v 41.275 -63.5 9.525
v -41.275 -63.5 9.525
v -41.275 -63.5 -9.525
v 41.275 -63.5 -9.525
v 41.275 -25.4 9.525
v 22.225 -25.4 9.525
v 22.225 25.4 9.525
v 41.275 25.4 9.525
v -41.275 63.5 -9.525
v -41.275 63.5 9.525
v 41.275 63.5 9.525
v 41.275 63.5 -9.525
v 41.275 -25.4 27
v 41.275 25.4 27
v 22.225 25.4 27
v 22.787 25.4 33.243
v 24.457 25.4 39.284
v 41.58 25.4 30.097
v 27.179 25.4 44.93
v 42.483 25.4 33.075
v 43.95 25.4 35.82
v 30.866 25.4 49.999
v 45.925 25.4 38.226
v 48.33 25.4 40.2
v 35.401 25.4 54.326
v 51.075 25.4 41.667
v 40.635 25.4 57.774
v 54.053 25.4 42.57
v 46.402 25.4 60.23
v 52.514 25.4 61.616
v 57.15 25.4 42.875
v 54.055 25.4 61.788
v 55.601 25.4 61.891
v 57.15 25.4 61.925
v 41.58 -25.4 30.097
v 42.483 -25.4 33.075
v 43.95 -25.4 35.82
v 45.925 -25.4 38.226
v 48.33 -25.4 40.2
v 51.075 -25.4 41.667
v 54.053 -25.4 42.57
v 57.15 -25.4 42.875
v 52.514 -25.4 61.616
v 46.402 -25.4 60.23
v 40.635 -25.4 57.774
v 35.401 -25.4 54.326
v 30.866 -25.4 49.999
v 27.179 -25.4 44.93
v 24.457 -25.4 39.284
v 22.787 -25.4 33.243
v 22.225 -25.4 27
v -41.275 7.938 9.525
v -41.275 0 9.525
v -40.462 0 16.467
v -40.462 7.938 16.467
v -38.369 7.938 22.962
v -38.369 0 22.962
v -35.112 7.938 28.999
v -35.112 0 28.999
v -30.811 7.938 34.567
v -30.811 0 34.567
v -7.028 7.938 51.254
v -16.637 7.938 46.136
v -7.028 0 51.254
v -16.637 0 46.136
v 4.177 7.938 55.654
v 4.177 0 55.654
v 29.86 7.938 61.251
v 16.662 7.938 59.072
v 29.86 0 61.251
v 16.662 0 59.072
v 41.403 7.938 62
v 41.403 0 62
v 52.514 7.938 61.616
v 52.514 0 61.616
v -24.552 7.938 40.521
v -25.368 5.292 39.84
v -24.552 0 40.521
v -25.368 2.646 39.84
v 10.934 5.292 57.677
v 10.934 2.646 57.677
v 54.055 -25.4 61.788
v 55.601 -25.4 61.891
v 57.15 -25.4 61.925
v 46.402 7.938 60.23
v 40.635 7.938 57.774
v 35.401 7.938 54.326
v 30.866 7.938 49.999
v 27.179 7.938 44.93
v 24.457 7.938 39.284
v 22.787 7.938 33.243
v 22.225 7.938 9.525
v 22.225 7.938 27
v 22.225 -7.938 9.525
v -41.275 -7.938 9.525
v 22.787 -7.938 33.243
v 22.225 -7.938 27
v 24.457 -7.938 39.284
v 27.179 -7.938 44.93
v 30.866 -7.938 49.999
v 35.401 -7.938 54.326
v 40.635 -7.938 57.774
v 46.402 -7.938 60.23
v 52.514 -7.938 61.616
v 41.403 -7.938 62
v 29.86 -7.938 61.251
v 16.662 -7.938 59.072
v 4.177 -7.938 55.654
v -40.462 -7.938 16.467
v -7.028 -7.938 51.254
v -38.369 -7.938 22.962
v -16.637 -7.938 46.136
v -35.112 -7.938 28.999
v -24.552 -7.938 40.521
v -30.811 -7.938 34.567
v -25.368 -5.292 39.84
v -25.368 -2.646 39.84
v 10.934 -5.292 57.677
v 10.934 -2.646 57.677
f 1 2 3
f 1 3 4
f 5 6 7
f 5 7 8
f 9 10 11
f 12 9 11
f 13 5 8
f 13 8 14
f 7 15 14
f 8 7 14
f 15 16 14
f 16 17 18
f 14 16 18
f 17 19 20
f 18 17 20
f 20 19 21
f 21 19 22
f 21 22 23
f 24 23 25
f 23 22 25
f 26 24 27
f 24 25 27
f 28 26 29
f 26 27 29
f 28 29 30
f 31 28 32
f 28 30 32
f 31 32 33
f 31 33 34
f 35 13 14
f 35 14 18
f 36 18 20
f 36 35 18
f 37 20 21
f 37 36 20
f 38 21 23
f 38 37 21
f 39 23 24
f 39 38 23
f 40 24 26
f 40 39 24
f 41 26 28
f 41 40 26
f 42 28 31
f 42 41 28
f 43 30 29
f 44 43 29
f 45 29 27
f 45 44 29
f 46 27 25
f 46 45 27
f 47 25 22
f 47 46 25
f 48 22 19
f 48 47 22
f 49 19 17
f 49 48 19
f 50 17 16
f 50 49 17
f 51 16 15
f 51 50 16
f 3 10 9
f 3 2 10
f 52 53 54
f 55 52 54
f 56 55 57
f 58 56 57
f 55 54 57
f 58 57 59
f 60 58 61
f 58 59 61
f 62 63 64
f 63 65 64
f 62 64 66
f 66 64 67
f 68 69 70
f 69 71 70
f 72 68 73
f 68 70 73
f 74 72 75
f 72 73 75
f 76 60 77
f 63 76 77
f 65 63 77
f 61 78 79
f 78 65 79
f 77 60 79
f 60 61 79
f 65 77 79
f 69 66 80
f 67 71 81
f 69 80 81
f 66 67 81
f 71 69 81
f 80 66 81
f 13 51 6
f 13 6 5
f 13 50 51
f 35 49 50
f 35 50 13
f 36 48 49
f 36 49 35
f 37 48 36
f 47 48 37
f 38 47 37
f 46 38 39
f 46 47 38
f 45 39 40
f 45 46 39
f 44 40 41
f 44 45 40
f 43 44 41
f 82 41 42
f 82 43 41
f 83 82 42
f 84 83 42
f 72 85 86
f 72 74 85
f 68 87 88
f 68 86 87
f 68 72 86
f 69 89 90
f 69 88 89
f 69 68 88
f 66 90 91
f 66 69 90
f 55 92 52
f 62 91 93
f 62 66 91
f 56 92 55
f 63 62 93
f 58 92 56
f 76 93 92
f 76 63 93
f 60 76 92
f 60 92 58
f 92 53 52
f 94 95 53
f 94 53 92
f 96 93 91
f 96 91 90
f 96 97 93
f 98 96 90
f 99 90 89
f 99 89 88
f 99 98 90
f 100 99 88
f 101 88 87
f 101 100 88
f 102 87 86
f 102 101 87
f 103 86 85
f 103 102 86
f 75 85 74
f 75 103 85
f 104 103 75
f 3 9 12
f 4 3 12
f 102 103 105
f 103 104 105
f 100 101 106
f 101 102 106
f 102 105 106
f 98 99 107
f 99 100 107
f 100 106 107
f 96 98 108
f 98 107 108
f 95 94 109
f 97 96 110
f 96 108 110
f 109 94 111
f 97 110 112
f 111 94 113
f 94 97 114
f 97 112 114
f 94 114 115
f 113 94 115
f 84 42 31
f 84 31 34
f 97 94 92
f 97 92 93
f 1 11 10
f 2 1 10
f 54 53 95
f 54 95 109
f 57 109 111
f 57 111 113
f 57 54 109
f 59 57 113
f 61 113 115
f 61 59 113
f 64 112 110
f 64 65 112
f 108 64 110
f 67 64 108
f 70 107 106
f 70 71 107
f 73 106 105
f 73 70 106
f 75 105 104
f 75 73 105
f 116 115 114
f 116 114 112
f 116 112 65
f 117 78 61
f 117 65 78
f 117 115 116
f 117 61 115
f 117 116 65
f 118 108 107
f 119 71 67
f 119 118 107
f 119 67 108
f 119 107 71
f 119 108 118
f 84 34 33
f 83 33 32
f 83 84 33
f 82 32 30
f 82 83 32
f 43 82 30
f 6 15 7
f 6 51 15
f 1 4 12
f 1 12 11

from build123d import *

# Parameters (mm, degrees)
F1_DEPTH = 63.5
F2_DEPTH = 25.4
F3_DEPTH = 7.9375


with BuildPart() as f1:
    # F0 (on Front) → F1 (new body, symmetric)
    with BuildSketch(Plane.XZ):
        Polygon((22.225, 9.525), (-41.275, 9.525), (-41.275, -9.525), (41.275, -9.525), (41.275, 9.525), align=None)
    extrude(amount=F1_DEPTH, both=True)


with BuildPart() as f2:
    # F0 (on Front) → F2 (new body, symmetric)
    with BuildSketch(Plane.XZ):
        with BuildLine():
            Line((22.225, 27.0002), (22.225, 9.525))
            Line((22.225, 9.525), (41.275, 9.525))
            Line((41.275, 9.525), (41.275, 27.0002))
            ThreePointArc((41.275, 27.0002), (45.92468, 38.22552), (57.15, 42.8752))
            Line((57.15, 42.8752), (57.15, 61.9252))
            ThreePointArc((57.15, 61.9252), (54.827081, 61.847864), (52.51445, 61.616198))
            ThreePointArc((52.51445, 61.616198), (30.866429, 49.998668), (22.225, 27.0002))
        make_face()
    extrude(amount=F2_DEPTH, both=True)


with BuildPart() as f3:
    # F0 (on Front) → F3 (new body, symmetric)
    with BuildSketch(Plane.XZ):
        with BuildLine():
            add(Edge.make_bspline(
                [(-41.275, 9.525), (-40.606309, 45.603905), (13.335578, 65.100968), (52.51445, 61.616198)],
                knots=[0, 0, 0, 0, 107.284453, 107.284453, 107.284453, 107.284453], degree=3))
            Line((-41.275, 9.525), (22.225, 9.525))
            Line((22.225, 9.525), (22.225, 27.0002))
            ThreePointArc((22.225, 27.0002), (30.866429, 49.998668), (52.51445, 61.616198))
        make_face()
    extrude(amount=F3_DEPTH, both=True)


solid = Compound([f1.part, f2.part, f3.part])
